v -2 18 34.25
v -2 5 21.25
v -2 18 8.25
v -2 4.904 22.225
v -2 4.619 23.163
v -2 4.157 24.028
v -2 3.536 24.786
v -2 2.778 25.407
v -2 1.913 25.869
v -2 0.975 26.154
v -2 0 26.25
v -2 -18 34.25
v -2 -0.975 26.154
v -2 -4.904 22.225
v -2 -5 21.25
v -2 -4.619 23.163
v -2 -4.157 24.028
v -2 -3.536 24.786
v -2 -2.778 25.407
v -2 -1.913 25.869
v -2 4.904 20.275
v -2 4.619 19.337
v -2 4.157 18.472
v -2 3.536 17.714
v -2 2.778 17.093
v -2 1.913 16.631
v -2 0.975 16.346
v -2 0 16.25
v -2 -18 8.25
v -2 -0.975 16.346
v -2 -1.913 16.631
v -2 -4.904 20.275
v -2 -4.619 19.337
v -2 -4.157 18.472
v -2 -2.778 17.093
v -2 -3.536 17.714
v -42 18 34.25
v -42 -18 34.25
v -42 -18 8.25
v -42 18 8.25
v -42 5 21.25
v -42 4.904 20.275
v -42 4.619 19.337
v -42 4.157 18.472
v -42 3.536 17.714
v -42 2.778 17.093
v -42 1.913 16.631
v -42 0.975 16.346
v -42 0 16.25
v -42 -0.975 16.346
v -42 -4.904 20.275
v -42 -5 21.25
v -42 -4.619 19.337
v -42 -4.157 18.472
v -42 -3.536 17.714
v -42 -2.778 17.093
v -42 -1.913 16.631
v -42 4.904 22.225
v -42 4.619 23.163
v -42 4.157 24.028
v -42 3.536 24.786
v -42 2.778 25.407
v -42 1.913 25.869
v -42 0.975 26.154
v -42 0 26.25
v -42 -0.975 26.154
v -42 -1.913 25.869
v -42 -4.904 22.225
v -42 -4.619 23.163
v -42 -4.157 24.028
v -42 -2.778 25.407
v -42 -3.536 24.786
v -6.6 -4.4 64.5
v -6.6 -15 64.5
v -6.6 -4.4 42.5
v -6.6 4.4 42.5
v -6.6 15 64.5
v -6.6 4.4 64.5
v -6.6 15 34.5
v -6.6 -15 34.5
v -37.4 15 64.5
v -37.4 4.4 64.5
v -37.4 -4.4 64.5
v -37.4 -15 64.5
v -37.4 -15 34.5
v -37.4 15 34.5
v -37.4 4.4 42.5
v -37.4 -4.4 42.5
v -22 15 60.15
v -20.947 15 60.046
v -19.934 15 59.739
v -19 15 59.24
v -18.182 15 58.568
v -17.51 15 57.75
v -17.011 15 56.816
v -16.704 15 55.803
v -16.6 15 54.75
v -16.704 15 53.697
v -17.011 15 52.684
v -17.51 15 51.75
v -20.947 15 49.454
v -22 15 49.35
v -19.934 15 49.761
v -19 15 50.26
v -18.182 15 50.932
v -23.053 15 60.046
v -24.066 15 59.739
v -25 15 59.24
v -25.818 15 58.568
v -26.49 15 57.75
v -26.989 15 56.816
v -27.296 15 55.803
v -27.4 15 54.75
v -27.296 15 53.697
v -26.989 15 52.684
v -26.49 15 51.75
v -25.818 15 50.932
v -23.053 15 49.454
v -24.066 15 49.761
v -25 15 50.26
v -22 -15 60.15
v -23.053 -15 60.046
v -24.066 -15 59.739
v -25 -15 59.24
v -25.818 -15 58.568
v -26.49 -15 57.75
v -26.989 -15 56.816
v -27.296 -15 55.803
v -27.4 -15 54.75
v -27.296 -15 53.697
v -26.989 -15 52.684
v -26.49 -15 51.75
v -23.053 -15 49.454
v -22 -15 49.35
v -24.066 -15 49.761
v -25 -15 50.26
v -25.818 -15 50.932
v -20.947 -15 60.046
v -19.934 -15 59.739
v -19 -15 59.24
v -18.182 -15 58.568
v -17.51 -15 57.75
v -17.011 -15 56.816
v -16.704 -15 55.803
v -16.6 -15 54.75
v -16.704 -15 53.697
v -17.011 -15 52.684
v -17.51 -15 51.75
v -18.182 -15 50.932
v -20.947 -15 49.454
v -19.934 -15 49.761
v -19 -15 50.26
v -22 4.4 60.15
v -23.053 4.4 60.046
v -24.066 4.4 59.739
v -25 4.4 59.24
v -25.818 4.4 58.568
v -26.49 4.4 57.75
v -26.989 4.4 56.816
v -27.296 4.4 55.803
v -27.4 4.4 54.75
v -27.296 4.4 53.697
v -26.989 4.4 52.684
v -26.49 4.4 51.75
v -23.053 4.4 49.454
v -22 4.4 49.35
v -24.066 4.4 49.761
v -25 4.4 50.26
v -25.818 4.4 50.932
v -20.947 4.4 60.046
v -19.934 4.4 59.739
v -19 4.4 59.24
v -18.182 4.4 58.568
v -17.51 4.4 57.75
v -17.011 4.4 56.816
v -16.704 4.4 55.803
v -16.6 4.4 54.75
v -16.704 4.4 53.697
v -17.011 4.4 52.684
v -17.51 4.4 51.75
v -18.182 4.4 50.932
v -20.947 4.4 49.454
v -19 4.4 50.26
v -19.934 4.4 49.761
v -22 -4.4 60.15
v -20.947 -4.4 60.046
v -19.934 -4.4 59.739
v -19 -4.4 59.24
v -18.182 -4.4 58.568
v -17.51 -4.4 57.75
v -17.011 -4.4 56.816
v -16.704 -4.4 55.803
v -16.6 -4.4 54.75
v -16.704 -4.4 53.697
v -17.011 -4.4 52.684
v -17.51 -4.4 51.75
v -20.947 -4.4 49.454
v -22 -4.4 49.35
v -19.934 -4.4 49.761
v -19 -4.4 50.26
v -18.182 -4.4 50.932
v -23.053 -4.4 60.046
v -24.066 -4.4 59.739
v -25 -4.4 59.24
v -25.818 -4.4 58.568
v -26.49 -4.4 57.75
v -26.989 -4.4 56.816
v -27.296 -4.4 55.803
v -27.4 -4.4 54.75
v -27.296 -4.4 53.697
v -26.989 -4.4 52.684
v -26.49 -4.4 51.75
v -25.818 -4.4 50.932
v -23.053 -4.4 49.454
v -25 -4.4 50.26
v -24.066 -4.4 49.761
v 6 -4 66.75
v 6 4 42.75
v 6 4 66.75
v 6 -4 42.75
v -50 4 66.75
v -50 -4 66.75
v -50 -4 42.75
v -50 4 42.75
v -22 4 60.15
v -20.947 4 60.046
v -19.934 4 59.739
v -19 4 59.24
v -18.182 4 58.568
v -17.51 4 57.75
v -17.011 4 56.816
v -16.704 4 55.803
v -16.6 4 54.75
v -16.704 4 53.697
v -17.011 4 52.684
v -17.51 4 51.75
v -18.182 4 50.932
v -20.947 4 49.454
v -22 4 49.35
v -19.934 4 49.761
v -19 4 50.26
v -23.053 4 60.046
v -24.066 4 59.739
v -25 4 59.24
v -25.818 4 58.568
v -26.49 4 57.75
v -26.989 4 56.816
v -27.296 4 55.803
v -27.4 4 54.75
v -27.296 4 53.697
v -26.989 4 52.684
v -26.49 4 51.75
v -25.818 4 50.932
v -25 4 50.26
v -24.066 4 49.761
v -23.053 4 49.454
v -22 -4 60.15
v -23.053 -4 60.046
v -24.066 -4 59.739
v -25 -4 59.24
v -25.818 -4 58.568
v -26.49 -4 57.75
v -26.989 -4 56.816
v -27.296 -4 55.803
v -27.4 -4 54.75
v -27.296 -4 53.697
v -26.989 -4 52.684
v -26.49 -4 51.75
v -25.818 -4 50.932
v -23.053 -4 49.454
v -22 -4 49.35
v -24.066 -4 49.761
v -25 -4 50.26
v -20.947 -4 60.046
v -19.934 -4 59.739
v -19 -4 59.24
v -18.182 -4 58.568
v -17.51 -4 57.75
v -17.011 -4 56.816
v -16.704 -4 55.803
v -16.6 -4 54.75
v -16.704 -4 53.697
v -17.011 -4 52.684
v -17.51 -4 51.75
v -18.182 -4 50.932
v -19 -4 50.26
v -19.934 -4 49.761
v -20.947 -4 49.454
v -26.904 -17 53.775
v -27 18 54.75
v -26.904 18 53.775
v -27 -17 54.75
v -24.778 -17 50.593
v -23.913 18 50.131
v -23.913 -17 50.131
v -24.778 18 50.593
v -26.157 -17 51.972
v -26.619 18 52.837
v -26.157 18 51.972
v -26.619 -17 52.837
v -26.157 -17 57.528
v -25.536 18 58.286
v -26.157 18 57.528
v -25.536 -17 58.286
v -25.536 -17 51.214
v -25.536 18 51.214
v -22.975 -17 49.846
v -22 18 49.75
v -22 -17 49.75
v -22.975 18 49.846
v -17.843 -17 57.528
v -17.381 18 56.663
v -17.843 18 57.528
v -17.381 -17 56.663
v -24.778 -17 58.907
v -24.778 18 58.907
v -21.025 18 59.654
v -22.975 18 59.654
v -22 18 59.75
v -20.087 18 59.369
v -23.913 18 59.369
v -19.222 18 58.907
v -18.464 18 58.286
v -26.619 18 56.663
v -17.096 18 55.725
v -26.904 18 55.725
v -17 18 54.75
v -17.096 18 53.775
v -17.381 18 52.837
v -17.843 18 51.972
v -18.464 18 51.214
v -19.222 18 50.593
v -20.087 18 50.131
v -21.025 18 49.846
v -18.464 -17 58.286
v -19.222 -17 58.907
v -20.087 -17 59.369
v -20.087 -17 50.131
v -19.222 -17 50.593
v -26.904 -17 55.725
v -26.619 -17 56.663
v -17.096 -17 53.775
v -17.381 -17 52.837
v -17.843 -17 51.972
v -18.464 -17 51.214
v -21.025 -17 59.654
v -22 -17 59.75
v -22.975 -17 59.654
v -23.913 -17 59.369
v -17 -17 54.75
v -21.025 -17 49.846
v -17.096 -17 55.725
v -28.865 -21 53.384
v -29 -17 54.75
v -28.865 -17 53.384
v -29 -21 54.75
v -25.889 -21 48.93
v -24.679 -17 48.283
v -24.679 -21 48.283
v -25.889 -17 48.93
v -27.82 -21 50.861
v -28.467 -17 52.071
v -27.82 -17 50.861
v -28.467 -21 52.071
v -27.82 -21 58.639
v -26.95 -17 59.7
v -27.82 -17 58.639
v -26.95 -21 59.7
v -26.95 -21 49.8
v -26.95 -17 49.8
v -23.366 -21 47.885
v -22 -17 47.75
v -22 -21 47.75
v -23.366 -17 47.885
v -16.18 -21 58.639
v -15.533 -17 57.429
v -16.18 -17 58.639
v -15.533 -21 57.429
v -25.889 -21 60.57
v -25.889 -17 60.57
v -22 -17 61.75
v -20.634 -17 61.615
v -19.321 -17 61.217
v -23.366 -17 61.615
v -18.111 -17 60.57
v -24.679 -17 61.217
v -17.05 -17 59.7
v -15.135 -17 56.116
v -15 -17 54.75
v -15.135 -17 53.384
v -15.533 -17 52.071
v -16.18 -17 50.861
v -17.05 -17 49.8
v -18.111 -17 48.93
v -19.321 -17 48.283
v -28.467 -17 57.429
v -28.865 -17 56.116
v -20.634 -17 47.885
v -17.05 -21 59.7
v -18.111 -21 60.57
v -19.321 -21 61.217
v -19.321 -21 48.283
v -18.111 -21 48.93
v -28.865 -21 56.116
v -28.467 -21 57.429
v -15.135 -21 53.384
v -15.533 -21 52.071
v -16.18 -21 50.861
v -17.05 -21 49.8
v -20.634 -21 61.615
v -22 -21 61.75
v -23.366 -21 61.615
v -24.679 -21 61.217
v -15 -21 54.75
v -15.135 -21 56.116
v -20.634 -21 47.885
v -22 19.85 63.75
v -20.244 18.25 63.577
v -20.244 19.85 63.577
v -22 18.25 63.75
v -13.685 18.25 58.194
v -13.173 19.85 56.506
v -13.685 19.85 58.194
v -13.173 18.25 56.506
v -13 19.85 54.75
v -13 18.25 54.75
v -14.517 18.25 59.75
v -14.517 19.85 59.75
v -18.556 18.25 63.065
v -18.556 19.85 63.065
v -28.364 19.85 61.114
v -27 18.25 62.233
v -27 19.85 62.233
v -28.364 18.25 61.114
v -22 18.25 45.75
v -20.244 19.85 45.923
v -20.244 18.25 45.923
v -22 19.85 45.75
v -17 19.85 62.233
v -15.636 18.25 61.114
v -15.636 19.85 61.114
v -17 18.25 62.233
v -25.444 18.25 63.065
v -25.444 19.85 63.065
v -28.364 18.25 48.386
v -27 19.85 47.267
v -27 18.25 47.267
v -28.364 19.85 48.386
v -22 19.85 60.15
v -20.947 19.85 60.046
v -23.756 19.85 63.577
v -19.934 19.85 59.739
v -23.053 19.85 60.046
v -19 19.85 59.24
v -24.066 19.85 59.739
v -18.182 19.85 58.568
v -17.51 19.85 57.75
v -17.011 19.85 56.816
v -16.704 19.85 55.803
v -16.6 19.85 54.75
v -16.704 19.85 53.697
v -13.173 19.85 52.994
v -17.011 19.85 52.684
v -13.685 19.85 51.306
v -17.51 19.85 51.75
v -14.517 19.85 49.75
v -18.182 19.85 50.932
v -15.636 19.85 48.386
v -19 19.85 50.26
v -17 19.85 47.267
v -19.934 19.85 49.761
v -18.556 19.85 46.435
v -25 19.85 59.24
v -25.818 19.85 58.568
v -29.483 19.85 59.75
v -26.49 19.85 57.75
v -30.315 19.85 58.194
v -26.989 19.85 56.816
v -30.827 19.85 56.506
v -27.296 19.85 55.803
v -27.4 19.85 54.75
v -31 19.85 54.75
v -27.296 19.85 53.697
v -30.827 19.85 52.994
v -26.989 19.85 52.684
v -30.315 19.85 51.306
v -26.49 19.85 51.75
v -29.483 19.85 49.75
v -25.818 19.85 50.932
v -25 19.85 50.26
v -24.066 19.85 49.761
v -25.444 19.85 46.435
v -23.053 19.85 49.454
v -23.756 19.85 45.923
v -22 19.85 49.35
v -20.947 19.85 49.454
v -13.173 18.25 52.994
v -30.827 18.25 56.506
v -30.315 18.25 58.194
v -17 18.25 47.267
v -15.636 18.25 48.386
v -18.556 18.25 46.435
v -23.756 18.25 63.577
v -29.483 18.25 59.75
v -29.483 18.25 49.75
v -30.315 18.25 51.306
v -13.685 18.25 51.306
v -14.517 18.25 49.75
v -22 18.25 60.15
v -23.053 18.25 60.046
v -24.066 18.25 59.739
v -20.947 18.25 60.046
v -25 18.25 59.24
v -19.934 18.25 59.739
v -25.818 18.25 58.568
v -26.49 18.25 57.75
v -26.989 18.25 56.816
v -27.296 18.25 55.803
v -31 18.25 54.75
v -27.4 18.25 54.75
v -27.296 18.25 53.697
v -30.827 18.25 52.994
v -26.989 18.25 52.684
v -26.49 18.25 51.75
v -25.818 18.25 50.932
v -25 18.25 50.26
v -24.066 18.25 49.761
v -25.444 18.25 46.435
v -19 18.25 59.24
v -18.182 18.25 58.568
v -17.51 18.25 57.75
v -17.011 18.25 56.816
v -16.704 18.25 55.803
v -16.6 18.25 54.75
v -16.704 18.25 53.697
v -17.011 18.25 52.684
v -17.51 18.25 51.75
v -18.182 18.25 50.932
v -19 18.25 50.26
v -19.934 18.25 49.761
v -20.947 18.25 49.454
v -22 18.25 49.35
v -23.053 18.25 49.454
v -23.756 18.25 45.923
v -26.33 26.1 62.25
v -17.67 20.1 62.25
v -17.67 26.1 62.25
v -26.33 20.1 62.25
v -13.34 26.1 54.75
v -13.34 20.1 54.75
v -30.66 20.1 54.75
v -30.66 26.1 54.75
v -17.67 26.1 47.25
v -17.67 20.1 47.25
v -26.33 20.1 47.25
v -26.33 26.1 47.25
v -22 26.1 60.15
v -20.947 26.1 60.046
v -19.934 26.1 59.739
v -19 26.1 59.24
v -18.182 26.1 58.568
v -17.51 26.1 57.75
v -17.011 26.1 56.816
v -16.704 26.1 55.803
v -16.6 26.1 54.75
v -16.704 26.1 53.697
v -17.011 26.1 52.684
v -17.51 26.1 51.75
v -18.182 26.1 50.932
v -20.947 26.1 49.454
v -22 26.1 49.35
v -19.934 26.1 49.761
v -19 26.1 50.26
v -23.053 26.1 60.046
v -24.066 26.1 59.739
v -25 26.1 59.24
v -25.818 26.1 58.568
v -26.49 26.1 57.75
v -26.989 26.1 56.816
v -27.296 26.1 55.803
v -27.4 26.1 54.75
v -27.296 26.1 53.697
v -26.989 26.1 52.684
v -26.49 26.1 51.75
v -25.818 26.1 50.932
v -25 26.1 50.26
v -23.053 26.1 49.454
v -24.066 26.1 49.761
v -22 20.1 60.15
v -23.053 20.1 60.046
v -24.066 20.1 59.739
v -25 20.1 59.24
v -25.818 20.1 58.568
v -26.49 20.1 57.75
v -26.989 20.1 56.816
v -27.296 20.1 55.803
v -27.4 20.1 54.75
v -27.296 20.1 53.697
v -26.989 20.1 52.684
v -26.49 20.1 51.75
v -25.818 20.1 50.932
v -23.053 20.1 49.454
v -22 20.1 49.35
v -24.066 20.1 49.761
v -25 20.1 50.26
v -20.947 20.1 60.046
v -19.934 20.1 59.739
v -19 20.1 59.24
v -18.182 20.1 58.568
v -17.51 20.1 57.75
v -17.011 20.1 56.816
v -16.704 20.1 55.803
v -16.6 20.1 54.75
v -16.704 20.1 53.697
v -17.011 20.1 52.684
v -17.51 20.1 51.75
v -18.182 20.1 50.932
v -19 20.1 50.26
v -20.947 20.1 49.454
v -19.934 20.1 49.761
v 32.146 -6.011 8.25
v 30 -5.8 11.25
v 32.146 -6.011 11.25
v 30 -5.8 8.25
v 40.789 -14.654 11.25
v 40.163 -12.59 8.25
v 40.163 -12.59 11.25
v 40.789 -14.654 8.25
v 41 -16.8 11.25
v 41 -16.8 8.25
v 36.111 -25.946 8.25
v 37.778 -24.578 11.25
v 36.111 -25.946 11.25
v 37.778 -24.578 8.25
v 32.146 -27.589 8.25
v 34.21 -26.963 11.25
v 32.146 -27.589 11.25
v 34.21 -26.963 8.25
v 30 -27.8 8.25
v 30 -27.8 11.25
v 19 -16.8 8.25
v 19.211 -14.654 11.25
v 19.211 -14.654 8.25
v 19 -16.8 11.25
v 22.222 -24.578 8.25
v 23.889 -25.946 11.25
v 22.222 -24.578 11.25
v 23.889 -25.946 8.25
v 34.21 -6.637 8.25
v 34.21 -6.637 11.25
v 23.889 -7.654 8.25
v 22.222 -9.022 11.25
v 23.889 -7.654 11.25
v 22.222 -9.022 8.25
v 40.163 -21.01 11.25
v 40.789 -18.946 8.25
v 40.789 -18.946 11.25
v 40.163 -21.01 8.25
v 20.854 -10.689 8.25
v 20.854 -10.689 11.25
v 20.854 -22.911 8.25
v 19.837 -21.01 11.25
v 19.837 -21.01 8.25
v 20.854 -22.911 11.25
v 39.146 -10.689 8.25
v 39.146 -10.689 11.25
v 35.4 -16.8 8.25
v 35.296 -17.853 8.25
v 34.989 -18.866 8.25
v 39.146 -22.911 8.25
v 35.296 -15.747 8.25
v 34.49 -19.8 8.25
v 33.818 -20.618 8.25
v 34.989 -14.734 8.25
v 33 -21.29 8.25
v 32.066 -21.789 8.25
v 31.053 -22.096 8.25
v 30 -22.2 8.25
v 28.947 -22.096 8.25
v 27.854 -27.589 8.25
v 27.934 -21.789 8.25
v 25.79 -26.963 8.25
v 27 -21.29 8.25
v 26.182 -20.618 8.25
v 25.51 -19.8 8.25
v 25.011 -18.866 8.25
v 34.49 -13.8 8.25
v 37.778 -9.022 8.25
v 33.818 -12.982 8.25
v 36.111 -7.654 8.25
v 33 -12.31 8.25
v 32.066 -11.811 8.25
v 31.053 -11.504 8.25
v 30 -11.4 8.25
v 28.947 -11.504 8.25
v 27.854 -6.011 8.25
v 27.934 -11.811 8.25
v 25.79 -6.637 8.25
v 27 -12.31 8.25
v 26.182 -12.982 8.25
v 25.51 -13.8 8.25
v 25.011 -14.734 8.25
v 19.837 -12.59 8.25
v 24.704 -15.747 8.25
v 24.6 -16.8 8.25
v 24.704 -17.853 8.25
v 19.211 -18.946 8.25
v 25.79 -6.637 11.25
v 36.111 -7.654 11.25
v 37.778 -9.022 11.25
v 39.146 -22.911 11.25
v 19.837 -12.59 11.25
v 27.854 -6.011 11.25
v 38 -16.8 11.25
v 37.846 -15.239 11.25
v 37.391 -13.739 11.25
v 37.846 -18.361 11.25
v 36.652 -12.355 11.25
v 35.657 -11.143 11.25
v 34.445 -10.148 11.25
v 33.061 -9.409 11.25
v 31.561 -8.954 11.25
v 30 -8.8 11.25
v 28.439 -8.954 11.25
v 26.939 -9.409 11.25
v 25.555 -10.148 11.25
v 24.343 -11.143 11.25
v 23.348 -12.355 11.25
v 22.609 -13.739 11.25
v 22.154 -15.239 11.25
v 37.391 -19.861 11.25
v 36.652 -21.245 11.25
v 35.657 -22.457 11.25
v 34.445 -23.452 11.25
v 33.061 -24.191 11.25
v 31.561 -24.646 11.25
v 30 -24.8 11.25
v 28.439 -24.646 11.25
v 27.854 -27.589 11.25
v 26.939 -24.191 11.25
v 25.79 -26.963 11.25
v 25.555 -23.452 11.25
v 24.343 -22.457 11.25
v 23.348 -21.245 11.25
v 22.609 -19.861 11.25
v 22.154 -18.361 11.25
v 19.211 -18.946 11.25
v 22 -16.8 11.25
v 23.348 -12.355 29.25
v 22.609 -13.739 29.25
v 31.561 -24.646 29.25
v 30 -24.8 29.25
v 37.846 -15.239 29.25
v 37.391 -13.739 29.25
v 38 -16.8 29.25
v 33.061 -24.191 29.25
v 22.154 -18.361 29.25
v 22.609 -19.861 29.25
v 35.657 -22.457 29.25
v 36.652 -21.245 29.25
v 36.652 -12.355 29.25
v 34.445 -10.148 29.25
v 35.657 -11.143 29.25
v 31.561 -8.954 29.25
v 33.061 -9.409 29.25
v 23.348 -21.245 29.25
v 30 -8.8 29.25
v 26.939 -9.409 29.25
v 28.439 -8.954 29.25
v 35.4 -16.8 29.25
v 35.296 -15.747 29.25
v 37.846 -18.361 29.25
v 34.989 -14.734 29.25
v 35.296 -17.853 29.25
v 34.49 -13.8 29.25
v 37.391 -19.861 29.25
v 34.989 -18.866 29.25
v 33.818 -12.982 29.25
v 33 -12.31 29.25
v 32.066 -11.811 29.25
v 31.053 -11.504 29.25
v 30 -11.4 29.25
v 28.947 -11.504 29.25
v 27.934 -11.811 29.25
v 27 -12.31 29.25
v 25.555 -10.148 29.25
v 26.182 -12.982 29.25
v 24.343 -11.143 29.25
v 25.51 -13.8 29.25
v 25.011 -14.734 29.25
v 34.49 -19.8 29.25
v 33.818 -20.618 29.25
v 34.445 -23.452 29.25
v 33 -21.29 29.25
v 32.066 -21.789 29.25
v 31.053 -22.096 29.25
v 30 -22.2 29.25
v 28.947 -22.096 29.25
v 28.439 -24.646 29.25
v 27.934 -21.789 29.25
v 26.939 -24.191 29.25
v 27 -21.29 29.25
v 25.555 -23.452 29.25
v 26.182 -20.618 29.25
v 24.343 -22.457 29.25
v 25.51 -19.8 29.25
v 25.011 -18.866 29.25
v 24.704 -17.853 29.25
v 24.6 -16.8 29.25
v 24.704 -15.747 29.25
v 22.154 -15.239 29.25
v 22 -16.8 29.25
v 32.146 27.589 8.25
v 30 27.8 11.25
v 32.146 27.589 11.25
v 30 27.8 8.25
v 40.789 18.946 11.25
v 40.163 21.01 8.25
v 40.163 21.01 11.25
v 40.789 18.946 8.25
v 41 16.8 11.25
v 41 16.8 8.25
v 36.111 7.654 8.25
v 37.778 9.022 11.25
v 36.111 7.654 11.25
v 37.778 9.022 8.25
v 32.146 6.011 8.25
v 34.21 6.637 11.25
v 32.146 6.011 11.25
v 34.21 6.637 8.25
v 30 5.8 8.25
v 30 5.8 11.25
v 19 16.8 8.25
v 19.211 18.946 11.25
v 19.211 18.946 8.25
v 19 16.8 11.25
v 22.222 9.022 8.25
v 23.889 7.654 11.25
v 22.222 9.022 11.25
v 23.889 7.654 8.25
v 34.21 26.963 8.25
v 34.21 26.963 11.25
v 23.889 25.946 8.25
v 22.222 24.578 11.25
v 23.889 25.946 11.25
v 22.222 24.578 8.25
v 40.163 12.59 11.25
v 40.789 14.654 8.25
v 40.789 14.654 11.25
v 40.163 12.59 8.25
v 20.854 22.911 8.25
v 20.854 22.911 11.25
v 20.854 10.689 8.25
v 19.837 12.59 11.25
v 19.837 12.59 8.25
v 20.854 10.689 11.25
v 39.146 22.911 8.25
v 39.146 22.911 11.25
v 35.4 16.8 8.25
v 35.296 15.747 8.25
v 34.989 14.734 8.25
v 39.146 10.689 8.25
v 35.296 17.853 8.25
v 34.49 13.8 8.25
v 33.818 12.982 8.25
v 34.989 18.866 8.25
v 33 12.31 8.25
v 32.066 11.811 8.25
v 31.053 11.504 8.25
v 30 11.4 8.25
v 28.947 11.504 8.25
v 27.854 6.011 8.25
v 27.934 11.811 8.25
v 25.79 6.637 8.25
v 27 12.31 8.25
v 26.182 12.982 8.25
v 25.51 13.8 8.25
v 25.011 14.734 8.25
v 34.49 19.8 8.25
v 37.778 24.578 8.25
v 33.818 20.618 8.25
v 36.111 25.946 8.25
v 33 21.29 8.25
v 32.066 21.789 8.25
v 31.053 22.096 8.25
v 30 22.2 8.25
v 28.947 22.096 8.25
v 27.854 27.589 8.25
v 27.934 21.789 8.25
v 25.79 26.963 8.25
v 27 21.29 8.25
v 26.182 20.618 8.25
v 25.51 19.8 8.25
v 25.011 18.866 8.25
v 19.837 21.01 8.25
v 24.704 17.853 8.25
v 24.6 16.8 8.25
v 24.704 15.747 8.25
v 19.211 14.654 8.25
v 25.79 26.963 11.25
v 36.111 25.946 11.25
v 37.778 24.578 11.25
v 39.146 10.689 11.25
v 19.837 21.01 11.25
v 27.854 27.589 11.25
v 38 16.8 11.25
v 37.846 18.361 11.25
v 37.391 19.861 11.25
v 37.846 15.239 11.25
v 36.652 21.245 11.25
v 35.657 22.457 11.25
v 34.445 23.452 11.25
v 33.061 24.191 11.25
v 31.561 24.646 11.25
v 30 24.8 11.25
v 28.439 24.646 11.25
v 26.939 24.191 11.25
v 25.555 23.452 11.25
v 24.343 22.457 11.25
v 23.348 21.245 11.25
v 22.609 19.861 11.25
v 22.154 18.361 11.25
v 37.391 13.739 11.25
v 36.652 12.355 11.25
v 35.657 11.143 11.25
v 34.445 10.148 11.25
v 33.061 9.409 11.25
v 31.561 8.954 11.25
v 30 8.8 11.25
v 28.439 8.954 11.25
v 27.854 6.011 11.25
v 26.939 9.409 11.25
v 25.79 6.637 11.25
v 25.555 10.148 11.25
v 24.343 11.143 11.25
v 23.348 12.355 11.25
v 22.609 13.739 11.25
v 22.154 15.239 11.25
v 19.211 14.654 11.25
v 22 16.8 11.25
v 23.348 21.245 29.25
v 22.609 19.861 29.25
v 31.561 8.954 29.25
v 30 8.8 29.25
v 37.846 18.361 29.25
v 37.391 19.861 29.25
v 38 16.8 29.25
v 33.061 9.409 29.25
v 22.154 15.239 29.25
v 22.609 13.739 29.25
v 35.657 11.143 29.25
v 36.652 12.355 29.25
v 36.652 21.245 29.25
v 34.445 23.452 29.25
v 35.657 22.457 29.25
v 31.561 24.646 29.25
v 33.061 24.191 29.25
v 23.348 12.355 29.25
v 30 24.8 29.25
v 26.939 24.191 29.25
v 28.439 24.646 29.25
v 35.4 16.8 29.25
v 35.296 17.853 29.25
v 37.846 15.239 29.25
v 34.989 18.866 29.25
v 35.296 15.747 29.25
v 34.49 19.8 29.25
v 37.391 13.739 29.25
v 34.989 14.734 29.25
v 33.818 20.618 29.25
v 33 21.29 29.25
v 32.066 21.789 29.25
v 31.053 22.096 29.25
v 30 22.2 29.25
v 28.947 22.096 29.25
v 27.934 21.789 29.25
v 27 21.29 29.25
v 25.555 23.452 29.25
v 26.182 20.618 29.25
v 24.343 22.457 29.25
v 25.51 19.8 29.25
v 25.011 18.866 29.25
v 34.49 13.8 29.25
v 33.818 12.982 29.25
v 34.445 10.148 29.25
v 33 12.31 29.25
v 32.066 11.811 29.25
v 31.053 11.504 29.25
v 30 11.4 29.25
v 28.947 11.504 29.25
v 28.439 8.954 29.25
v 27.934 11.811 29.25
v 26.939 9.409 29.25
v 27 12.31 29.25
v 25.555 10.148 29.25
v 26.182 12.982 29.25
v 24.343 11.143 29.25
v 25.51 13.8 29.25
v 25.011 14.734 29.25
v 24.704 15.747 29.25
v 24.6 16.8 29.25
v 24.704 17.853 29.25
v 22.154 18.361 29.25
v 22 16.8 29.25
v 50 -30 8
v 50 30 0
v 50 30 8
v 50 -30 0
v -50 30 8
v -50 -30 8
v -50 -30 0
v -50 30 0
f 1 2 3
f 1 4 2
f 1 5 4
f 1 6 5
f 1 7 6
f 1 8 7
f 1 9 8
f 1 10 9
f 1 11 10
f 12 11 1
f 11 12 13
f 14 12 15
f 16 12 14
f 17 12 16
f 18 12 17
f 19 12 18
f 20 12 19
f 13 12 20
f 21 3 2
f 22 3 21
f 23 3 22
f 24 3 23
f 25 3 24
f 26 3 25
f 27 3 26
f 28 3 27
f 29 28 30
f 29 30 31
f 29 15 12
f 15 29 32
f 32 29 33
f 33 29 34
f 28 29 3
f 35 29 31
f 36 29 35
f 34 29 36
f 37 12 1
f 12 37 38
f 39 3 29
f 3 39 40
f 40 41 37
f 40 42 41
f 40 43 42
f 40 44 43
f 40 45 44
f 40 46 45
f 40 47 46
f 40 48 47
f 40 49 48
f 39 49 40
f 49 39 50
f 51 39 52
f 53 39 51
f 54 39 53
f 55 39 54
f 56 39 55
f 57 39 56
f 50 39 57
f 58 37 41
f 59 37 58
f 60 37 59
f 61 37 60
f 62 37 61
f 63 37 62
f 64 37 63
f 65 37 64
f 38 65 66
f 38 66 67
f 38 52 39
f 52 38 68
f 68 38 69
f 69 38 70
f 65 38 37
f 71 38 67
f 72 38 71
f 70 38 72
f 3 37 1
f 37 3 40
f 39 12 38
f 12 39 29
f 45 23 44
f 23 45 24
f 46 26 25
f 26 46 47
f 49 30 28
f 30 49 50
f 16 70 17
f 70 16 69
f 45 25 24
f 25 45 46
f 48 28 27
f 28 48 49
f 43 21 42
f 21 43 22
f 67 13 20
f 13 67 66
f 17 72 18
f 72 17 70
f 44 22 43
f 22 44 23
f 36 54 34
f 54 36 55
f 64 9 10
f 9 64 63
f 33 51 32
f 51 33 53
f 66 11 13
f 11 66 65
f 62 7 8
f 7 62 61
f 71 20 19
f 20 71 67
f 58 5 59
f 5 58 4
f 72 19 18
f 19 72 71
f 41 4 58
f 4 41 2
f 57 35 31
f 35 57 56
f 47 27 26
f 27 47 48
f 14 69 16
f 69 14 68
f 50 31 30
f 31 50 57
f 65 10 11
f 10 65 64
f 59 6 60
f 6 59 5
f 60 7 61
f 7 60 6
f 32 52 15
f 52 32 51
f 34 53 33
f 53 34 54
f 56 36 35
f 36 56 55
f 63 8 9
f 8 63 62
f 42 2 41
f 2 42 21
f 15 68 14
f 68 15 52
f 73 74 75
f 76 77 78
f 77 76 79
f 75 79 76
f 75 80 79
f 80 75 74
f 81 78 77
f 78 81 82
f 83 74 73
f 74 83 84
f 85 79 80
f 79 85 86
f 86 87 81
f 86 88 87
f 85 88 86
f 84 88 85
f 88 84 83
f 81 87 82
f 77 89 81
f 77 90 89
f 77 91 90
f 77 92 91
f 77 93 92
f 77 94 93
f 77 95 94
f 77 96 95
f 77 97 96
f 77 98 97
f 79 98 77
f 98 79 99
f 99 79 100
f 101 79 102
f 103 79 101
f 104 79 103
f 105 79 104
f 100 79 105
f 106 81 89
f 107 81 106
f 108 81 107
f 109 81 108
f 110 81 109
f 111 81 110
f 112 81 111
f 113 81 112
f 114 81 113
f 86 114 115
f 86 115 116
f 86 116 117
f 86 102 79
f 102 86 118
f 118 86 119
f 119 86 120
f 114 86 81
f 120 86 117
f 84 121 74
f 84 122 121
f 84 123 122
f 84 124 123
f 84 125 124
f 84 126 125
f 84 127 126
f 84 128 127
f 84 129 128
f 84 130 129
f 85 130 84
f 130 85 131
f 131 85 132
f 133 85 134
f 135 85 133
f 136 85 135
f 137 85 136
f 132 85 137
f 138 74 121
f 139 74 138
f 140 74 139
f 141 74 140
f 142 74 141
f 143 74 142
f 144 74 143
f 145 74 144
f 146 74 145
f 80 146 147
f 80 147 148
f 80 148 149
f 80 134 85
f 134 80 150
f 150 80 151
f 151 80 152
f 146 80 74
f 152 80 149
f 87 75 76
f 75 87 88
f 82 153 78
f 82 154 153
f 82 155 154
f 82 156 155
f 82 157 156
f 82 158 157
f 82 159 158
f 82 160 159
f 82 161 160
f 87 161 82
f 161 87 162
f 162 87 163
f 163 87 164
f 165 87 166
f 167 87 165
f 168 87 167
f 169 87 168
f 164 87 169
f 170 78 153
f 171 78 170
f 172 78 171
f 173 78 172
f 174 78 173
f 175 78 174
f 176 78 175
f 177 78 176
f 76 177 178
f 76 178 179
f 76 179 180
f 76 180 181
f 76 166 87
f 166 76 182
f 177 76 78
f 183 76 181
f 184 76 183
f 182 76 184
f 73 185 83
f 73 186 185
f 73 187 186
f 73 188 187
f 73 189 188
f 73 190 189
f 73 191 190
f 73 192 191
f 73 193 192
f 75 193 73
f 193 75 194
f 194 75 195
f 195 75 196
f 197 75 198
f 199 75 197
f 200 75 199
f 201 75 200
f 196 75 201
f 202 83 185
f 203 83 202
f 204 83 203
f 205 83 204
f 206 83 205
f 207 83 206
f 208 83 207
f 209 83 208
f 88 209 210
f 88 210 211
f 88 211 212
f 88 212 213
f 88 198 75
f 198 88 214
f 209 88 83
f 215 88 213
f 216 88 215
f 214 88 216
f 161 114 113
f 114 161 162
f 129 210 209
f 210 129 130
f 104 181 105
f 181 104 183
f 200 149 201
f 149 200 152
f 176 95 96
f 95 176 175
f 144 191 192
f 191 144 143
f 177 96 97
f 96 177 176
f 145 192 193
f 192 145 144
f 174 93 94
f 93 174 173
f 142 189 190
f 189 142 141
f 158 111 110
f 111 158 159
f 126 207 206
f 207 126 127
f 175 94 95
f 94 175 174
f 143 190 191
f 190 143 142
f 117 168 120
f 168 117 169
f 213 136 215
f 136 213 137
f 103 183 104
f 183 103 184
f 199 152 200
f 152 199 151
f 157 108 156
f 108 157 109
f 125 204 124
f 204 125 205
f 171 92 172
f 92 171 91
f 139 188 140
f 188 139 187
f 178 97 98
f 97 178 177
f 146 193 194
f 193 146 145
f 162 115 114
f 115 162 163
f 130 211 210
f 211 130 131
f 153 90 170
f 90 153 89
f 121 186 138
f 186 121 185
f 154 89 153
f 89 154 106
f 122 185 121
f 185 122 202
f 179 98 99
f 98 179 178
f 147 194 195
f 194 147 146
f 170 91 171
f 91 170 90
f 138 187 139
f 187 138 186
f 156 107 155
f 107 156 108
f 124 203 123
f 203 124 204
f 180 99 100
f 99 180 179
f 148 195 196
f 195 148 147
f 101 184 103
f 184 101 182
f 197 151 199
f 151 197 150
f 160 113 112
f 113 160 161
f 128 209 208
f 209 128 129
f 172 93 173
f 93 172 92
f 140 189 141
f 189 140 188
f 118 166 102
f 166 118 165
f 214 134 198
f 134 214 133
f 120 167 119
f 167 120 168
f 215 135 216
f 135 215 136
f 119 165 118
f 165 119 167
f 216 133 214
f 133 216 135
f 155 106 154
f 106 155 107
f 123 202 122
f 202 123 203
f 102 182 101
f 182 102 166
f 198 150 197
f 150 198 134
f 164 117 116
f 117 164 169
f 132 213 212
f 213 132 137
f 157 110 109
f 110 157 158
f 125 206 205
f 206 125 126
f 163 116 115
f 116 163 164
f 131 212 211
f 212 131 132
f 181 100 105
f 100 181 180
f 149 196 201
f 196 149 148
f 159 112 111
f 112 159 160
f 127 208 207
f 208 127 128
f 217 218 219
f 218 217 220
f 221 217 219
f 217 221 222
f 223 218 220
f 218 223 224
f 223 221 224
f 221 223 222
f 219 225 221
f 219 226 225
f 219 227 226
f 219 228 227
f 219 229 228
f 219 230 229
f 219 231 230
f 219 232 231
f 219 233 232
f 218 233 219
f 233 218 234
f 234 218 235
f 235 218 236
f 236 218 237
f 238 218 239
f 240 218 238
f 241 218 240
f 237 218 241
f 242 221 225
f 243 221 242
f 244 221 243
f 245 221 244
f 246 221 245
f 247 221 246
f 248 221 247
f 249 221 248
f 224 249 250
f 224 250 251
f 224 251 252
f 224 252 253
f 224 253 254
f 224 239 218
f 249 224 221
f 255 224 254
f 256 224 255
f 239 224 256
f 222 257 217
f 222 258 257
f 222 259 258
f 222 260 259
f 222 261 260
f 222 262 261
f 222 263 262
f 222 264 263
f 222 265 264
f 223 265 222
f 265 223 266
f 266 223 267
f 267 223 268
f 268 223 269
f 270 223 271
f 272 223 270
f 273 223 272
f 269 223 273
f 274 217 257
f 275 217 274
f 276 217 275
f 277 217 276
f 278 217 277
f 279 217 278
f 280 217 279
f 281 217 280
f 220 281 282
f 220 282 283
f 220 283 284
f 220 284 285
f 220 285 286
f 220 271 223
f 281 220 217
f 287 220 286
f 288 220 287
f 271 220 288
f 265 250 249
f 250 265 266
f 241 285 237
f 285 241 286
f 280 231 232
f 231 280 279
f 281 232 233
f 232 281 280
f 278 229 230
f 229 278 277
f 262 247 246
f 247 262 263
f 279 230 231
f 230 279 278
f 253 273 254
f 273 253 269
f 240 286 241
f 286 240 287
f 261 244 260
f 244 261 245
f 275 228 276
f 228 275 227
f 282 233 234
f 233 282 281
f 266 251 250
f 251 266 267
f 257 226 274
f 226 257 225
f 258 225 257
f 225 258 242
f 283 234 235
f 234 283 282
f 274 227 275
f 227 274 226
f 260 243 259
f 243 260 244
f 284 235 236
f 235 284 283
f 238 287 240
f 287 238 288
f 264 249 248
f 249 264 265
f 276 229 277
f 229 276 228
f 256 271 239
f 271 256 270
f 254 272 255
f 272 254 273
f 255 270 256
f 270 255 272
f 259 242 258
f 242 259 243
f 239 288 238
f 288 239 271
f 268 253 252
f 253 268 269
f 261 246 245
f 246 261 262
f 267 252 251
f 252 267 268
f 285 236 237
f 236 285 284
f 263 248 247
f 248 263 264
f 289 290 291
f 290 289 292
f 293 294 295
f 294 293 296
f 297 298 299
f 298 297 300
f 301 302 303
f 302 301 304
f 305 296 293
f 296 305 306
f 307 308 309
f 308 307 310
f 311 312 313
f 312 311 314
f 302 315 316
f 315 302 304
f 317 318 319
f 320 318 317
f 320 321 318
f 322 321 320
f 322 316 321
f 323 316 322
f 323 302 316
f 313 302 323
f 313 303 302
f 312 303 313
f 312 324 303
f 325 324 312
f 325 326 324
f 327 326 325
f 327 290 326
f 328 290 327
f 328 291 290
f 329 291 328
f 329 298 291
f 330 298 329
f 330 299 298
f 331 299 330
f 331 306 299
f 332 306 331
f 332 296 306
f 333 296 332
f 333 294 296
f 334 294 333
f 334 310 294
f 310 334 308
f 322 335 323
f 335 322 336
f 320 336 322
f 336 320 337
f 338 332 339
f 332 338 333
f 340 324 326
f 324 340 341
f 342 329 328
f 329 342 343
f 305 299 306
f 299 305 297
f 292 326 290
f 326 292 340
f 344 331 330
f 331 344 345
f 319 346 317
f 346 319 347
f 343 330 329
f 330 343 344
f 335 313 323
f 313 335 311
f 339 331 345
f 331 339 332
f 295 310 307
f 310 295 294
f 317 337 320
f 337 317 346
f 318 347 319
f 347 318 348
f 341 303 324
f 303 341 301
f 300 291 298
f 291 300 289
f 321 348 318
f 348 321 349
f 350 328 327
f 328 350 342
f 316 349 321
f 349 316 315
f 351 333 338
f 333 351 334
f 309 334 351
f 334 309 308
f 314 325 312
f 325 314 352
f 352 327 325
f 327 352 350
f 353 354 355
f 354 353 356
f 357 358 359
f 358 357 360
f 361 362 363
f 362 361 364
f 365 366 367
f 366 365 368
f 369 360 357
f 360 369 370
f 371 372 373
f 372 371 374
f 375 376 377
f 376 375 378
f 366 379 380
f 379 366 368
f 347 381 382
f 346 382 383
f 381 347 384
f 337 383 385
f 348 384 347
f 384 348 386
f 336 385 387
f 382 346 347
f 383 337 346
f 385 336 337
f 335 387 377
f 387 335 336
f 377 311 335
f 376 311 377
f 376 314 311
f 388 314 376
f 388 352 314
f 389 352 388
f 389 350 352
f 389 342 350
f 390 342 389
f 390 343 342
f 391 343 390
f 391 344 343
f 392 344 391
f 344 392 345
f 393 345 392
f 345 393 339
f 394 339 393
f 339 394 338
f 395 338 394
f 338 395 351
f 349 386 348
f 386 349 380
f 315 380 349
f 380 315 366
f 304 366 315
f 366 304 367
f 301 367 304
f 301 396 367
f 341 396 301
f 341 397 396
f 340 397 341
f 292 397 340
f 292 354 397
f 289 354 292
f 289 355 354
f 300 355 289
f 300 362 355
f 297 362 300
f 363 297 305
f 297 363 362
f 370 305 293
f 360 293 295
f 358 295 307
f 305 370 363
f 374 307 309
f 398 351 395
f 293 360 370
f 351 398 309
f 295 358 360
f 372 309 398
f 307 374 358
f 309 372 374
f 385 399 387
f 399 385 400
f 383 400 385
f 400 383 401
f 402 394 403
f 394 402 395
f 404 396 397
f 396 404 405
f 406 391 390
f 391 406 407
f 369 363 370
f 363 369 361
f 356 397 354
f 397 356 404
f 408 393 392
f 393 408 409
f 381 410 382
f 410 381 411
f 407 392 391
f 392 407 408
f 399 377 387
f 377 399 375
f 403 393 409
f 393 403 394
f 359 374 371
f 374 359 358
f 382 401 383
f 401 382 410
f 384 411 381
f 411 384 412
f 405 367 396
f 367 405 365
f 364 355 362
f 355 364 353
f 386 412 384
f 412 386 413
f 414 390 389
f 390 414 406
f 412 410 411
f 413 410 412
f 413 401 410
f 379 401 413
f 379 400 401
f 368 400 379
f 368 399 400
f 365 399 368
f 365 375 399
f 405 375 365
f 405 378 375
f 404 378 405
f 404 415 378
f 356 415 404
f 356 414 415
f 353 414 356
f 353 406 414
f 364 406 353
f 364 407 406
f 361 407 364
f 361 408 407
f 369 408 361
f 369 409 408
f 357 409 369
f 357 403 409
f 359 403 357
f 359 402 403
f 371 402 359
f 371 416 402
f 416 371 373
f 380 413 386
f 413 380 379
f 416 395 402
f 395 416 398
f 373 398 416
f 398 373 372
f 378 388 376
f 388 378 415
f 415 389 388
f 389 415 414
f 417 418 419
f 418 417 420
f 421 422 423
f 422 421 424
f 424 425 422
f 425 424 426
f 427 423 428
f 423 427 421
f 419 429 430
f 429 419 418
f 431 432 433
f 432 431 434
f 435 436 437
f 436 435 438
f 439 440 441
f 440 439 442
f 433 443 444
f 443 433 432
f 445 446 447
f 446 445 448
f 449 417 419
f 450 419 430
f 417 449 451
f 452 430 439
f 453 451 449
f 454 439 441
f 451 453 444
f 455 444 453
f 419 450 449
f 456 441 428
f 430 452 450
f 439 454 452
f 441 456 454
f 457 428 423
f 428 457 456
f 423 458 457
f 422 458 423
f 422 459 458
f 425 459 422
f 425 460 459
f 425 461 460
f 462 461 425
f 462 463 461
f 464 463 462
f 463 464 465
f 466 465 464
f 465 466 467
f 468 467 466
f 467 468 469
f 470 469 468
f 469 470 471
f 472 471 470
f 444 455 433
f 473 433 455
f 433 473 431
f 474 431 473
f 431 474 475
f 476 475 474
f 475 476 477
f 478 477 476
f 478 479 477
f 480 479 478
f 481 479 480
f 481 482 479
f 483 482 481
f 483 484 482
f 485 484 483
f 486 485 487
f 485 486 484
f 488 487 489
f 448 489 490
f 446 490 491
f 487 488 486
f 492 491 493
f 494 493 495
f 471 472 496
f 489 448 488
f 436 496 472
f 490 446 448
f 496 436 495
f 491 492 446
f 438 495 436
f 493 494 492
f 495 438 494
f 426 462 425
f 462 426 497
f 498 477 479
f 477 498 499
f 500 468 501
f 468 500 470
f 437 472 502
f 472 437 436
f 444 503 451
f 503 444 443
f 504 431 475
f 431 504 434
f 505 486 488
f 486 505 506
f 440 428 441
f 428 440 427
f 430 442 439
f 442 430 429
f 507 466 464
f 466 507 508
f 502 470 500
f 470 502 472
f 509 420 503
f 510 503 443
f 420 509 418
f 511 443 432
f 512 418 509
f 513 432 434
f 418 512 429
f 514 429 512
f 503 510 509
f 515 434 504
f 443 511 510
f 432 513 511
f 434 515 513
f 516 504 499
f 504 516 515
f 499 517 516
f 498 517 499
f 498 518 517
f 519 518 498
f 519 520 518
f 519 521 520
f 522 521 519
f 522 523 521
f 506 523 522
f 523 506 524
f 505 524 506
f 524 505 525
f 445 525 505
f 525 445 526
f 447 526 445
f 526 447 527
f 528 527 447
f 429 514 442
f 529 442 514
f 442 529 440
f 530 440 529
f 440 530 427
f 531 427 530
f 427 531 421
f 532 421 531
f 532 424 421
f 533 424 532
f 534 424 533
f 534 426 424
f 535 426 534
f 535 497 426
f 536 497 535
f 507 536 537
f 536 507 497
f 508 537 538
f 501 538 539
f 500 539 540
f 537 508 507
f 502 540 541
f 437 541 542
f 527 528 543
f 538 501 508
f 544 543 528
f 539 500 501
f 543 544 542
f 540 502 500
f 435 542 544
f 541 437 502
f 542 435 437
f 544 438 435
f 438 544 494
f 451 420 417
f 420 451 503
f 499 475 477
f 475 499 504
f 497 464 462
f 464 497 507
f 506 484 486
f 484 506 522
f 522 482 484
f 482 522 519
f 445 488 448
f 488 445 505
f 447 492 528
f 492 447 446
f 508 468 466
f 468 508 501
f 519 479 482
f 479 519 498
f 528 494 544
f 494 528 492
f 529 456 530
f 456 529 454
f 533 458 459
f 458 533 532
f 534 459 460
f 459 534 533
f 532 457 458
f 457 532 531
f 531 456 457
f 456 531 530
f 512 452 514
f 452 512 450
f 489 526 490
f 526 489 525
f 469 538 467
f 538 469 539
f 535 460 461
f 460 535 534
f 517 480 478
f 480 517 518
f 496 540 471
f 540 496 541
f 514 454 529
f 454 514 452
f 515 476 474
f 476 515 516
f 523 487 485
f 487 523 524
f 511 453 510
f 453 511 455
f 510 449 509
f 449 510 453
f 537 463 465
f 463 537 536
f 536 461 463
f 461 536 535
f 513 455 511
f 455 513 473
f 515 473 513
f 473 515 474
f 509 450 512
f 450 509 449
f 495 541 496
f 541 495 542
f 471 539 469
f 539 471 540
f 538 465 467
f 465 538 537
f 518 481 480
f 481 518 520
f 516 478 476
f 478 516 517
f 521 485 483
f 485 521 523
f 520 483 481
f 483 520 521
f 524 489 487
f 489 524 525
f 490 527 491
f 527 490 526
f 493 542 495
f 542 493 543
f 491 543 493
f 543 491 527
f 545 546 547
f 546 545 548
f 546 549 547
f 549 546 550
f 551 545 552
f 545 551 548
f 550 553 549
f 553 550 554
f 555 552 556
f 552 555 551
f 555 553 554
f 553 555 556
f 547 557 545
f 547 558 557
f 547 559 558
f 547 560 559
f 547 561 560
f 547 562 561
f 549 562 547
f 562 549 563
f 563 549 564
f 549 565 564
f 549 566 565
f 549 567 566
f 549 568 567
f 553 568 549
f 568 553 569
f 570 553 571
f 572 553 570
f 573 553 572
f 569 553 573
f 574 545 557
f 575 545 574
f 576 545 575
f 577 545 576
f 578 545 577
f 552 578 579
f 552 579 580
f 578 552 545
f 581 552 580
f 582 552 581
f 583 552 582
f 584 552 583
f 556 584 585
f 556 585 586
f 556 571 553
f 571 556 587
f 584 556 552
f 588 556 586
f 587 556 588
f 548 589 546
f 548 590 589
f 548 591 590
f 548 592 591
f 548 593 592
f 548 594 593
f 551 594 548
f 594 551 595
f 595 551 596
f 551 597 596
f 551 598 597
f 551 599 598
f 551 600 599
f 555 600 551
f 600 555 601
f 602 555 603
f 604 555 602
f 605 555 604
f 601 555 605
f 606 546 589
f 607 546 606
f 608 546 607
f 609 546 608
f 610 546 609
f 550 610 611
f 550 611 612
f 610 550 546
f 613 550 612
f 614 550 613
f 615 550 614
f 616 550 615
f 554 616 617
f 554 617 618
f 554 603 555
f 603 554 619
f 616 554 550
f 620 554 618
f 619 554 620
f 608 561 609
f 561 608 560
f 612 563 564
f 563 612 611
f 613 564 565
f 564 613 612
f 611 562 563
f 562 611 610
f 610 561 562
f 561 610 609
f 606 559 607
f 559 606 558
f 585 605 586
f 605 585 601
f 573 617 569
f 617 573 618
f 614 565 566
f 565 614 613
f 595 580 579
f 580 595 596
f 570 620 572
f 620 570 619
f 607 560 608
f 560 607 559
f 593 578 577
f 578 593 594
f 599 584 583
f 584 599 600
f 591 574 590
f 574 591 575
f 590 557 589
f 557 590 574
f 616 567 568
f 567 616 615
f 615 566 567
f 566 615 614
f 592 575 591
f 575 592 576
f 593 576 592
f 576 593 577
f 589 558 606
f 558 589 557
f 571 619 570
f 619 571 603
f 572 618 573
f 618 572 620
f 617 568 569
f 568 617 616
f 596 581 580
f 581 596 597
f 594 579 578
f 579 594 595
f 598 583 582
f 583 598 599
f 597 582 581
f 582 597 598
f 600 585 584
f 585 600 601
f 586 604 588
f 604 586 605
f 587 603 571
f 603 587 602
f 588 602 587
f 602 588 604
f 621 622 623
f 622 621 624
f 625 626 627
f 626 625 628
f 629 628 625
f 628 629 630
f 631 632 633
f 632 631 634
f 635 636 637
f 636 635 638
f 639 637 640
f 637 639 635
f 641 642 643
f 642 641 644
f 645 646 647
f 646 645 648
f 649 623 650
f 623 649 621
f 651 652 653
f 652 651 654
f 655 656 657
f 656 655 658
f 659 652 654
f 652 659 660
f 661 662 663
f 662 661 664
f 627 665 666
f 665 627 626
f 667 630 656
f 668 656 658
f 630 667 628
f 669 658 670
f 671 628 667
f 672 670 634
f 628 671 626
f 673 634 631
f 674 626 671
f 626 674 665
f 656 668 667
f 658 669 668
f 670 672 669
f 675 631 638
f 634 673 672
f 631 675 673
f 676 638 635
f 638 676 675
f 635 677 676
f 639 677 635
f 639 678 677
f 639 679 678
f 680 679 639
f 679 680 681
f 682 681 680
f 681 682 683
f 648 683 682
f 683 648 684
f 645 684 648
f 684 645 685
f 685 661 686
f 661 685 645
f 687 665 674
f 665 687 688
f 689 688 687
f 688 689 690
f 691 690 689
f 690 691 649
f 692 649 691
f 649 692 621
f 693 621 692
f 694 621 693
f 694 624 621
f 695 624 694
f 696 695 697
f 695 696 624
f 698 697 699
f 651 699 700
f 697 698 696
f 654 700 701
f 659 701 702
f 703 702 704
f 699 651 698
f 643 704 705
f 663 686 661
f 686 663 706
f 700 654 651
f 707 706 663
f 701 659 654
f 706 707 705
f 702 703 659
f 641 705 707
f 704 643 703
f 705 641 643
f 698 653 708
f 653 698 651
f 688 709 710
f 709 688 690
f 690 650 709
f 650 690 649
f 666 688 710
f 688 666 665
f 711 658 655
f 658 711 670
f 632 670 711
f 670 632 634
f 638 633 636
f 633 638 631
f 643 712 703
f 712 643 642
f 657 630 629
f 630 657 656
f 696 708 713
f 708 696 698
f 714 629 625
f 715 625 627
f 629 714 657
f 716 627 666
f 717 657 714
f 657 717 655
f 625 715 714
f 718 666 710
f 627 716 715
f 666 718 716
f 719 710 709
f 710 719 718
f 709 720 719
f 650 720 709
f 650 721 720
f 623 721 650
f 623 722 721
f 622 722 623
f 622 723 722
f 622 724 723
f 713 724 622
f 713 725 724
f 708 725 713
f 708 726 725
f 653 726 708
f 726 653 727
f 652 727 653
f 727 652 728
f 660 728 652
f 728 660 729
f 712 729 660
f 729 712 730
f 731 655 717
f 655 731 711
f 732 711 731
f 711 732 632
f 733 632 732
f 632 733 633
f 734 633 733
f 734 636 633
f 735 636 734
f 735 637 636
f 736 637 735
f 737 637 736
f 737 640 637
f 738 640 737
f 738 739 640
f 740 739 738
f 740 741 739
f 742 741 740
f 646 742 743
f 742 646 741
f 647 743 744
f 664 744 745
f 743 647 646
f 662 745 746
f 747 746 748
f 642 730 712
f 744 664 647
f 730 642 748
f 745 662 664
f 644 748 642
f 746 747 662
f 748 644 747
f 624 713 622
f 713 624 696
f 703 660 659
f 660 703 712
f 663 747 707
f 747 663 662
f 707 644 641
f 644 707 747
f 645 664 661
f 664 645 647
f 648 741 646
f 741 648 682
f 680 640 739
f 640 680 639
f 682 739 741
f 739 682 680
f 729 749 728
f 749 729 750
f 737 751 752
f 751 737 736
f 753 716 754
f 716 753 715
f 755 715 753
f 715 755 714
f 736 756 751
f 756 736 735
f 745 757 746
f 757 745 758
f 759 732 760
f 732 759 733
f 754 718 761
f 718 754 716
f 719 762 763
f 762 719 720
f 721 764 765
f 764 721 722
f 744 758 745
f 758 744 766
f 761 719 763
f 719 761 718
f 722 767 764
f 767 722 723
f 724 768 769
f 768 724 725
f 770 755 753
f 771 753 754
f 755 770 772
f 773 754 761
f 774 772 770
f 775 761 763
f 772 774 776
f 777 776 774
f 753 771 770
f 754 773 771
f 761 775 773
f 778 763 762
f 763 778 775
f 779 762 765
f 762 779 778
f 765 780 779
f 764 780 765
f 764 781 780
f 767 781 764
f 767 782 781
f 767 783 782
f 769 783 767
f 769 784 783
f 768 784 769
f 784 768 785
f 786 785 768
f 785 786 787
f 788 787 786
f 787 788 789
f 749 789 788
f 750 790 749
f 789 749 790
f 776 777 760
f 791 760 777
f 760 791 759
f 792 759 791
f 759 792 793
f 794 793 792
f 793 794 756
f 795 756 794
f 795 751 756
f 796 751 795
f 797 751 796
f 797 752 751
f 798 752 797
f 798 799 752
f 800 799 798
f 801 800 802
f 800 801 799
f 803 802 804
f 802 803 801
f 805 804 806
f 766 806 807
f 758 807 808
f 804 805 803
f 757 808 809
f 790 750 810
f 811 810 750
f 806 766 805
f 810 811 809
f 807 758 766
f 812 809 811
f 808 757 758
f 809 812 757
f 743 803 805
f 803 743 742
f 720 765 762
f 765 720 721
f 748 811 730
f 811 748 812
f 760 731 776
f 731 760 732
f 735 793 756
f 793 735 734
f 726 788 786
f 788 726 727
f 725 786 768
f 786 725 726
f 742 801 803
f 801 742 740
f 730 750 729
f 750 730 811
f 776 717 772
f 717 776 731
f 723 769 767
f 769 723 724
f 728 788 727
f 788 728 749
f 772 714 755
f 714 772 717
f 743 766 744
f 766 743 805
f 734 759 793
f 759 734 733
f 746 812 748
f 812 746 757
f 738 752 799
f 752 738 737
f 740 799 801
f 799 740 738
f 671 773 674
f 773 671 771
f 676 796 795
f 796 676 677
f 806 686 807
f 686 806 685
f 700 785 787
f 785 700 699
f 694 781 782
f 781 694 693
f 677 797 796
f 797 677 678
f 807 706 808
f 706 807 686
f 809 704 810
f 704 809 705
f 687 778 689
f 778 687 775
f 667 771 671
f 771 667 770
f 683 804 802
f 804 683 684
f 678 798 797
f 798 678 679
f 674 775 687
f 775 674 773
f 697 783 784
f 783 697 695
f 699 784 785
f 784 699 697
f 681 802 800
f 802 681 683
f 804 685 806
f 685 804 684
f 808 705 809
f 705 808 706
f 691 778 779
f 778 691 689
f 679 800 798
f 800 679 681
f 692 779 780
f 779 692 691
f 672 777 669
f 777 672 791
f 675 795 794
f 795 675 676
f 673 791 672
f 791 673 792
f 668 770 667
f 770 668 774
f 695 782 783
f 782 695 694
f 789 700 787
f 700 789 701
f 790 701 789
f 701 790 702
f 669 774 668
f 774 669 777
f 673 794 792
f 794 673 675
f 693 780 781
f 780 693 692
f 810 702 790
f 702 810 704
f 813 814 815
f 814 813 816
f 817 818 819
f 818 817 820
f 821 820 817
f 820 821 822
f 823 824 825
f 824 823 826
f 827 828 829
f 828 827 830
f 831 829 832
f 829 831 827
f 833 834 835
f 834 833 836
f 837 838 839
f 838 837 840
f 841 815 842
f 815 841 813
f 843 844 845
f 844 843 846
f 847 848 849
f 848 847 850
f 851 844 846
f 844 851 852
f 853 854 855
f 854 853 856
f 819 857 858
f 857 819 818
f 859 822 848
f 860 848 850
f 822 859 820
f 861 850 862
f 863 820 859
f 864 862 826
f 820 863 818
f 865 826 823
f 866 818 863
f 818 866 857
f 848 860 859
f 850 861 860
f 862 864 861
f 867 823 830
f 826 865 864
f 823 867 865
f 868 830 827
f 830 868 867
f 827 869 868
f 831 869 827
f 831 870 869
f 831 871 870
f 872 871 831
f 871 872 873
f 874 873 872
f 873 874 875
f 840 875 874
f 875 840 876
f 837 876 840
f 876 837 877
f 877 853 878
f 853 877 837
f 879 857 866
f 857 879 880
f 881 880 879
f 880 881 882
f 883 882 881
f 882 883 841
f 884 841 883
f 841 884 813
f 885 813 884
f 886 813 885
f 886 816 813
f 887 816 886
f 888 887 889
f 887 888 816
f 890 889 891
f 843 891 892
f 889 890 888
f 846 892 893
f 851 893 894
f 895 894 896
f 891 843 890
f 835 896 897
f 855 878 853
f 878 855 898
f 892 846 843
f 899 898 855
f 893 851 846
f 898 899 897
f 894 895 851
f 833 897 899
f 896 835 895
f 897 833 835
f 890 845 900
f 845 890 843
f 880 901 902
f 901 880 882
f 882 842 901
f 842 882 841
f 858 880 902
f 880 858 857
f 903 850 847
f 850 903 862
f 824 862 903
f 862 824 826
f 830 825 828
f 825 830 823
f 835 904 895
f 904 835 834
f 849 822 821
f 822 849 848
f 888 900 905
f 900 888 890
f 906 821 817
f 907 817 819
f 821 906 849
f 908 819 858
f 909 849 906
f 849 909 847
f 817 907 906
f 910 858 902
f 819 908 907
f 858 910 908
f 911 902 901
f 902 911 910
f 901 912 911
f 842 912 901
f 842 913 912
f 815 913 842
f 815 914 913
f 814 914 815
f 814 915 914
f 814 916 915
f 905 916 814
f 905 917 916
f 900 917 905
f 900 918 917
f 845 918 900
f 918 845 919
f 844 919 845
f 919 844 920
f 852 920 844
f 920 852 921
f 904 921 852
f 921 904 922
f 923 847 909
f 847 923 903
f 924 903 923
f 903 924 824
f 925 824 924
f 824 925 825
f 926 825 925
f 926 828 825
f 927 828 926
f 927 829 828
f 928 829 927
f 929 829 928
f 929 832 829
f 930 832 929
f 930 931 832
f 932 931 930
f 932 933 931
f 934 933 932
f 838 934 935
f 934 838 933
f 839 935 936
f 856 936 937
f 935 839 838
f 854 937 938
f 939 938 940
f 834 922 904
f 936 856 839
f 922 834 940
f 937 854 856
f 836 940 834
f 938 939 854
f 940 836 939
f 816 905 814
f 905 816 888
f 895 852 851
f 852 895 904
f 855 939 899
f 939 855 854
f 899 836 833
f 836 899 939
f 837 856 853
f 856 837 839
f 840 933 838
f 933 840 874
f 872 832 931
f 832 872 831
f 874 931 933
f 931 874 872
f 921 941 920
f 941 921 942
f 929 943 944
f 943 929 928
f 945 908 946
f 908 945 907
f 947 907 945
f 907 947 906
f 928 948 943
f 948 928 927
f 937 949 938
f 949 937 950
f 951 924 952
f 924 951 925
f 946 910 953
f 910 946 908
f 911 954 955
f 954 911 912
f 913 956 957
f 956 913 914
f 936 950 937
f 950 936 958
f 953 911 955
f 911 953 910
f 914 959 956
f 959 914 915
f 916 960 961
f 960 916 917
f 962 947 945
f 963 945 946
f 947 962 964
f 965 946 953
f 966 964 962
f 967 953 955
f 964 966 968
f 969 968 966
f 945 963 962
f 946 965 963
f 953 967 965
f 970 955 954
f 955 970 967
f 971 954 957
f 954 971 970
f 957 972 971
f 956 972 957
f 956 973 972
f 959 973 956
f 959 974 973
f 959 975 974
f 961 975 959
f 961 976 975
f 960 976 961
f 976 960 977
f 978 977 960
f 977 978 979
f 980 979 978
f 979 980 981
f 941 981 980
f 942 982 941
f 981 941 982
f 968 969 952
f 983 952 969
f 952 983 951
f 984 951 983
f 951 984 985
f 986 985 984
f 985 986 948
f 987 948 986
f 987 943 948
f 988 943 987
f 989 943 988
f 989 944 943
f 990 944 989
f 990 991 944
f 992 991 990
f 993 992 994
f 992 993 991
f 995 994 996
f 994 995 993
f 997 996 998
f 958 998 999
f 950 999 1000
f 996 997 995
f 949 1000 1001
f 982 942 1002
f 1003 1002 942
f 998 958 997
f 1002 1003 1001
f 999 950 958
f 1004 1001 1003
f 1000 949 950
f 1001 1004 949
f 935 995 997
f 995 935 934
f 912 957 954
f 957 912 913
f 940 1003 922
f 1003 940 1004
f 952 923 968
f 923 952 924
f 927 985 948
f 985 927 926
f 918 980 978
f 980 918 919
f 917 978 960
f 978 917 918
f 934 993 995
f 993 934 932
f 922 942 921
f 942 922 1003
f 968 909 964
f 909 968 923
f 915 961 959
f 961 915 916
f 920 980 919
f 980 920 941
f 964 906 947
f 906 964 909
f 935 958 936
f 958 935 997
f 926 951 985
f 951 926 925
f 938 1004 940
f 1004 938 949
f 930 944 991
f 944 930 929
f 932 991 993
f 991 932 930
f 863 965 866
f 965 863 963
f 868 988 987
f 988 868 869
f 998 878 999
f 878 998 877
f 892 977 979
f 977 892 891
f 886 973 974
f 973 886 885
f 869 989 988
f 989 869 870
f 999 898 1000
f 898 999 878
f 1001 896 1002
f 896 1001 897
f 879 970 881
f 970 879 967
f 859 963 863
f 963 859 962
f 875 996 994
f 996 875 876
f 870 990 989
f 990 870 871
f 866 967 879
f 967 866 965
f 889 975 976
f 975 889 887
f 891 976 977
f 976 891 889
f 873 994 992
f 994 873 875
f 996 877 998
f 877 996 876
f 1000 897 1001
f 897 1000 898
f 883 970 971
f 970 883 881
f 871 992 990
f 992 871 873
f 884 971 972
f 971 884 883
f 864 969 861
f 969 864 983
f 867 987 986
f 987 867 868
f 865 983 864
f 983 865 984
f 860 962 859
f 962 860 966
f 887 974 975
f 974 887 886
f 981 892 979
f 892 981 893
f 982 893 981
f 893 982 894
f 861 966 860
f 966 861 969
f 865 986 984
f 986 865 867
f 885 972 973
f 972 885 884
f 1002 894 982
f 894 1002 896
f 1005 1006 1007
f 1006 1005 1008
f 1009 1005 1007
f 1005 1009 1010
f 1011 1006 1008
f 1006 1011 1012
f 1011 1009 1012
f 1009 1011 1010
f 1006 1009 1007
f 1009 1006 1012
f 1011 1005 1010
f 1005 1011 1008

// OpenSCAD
$fn = 32;

// ------------------------------------------------------------------------
// Indexing jig: plate 100 x 60 mm, pin d10
// Every part is its own module, assembly() places every instance.
// ------------------------------------------------------------------------

// --- part 1 ---
module jig_plate() {
  difference() {
    translate([-50, -30, 0]) cube([100, 60, 8]);
  }
}

// --- part 2 ---
module locator_block() {
  difference() {
    translate([-20, -18, 0]) cube([40, 36, 26]);
    translate([0, 0, 13]) rotate([0, 90, 0]) cylinder(h = 42, d = 10, center = true);
  }
}

// --- part 3 ---
module index_fork() {
  difference() {
    translate([-15.4, -15, 0]) cube([30.8, 30, 30]);
    translate([-16.4, -4.4, 8]) cube([32.8, 8.8, 23]);
    translate([0, 0, 20.25]) rotate([90, 0, 0]) cylinder(h = 32, d = 10.8, center = true);
  }
}

// --- part 4 ---
module index_arm() {
  difference() {
    translate([-28, -4, 0]) cube([56, 8, 24]);
    translate([0, 0, 12]) rotate([90, 0, 0]) cylinder(h = 10, d = 10.8, center = true);
  }
}

// --- part 5 ---
module index_pin() {
  rotate([0, 90, 0]) cylinder(h = 36, d = 10, center = true);
  translate([-21, 0, 0]) rotate([0, 90, 0]) cylinder(h = 4, d = 14);
}

// --- part 6 ---
module pin_washer() {
  difference() {
      translate([0, 0, 0]) cylinder(h = 1.6, d = 18);
      translate([0, 0, -1]) cylinder(h = 3.6, d = 10.8);
    }
}

// --- part 7 ---
module lock_nut() {
  difference() {
    linear_extrude(height = 6) polygon(points = [[8.66, 0], [4.33, 7.5], [-4.33, 7.5], [-8.66, 0], [-4.33, -7.5], [4.33, -7.5]]);
    translate([0, 0, -1]) cylinder(h = 8, d = 10.8);
  }
}

// --- part 8 ---
module guide_bush_a() {
  difference() {
    union() {
      cylinder(h = 3, d = 22);
      translate([0, 0, 3]) cylinder(h = 18, d = 16);
    }
    translate([0, 0, -1]) cylinder(h = 23, d = 10.8);
  }
}

// --- part 9 ---
module guide_bush_b() {
  difference() {
    union() {
      cylinder(h = 3, d = 22);
      translate([0, 0, 3]) cylinder(h = 18, d = 16);
    }
    translate([0, 0, -1]) cylinder(h = 23, d = 10.8);
  }
}

// --- assembly ---
module assembly() {
  color([0.80, 0.24, 0.20]) translate([0, 0, 0]) rotate([0, 0, 0]) jig_plate();
  color([0.20, 0.45, 0.75]) translate([-22, 0, 8.25]) rotate([0, 0, 0]) locator_block();
  color([0.25, 0.62, 0.32]) translate([-22, 0, 34.5]) rotate([0, 0, 0]) index_fork();
  color([0.92, 0.70, 0.18]) translate([-22, 0, 42.75]) rotate([0, 0, 0]) index_arm();
  color([0.58, 0.35, 0.70]) translate([-22, 0, 54.75]) rotate([0, 0, 90]) index_pin();
  color([0.16, 0.66, 0.66]) translate([-22, 19.85, 54.75]) rotate([90, 0, 0]) pin_washer();
  color([0.85, 0.48, 0.18]) translate([-22, 26.1, 54.75]) rotate([90, 0, 0]) lock_nut();
  color([0.55, 0.60, 0.65]) translate([30, -16.8, 8.25]) rotate([0, 0, 0]) guide_bush_a();
  color([0.75, 0.30, 0.55]) translate([30, 16.8, 8.25]) rotate([0, 0, 0]) guide_bush_b();
}

assembly();
